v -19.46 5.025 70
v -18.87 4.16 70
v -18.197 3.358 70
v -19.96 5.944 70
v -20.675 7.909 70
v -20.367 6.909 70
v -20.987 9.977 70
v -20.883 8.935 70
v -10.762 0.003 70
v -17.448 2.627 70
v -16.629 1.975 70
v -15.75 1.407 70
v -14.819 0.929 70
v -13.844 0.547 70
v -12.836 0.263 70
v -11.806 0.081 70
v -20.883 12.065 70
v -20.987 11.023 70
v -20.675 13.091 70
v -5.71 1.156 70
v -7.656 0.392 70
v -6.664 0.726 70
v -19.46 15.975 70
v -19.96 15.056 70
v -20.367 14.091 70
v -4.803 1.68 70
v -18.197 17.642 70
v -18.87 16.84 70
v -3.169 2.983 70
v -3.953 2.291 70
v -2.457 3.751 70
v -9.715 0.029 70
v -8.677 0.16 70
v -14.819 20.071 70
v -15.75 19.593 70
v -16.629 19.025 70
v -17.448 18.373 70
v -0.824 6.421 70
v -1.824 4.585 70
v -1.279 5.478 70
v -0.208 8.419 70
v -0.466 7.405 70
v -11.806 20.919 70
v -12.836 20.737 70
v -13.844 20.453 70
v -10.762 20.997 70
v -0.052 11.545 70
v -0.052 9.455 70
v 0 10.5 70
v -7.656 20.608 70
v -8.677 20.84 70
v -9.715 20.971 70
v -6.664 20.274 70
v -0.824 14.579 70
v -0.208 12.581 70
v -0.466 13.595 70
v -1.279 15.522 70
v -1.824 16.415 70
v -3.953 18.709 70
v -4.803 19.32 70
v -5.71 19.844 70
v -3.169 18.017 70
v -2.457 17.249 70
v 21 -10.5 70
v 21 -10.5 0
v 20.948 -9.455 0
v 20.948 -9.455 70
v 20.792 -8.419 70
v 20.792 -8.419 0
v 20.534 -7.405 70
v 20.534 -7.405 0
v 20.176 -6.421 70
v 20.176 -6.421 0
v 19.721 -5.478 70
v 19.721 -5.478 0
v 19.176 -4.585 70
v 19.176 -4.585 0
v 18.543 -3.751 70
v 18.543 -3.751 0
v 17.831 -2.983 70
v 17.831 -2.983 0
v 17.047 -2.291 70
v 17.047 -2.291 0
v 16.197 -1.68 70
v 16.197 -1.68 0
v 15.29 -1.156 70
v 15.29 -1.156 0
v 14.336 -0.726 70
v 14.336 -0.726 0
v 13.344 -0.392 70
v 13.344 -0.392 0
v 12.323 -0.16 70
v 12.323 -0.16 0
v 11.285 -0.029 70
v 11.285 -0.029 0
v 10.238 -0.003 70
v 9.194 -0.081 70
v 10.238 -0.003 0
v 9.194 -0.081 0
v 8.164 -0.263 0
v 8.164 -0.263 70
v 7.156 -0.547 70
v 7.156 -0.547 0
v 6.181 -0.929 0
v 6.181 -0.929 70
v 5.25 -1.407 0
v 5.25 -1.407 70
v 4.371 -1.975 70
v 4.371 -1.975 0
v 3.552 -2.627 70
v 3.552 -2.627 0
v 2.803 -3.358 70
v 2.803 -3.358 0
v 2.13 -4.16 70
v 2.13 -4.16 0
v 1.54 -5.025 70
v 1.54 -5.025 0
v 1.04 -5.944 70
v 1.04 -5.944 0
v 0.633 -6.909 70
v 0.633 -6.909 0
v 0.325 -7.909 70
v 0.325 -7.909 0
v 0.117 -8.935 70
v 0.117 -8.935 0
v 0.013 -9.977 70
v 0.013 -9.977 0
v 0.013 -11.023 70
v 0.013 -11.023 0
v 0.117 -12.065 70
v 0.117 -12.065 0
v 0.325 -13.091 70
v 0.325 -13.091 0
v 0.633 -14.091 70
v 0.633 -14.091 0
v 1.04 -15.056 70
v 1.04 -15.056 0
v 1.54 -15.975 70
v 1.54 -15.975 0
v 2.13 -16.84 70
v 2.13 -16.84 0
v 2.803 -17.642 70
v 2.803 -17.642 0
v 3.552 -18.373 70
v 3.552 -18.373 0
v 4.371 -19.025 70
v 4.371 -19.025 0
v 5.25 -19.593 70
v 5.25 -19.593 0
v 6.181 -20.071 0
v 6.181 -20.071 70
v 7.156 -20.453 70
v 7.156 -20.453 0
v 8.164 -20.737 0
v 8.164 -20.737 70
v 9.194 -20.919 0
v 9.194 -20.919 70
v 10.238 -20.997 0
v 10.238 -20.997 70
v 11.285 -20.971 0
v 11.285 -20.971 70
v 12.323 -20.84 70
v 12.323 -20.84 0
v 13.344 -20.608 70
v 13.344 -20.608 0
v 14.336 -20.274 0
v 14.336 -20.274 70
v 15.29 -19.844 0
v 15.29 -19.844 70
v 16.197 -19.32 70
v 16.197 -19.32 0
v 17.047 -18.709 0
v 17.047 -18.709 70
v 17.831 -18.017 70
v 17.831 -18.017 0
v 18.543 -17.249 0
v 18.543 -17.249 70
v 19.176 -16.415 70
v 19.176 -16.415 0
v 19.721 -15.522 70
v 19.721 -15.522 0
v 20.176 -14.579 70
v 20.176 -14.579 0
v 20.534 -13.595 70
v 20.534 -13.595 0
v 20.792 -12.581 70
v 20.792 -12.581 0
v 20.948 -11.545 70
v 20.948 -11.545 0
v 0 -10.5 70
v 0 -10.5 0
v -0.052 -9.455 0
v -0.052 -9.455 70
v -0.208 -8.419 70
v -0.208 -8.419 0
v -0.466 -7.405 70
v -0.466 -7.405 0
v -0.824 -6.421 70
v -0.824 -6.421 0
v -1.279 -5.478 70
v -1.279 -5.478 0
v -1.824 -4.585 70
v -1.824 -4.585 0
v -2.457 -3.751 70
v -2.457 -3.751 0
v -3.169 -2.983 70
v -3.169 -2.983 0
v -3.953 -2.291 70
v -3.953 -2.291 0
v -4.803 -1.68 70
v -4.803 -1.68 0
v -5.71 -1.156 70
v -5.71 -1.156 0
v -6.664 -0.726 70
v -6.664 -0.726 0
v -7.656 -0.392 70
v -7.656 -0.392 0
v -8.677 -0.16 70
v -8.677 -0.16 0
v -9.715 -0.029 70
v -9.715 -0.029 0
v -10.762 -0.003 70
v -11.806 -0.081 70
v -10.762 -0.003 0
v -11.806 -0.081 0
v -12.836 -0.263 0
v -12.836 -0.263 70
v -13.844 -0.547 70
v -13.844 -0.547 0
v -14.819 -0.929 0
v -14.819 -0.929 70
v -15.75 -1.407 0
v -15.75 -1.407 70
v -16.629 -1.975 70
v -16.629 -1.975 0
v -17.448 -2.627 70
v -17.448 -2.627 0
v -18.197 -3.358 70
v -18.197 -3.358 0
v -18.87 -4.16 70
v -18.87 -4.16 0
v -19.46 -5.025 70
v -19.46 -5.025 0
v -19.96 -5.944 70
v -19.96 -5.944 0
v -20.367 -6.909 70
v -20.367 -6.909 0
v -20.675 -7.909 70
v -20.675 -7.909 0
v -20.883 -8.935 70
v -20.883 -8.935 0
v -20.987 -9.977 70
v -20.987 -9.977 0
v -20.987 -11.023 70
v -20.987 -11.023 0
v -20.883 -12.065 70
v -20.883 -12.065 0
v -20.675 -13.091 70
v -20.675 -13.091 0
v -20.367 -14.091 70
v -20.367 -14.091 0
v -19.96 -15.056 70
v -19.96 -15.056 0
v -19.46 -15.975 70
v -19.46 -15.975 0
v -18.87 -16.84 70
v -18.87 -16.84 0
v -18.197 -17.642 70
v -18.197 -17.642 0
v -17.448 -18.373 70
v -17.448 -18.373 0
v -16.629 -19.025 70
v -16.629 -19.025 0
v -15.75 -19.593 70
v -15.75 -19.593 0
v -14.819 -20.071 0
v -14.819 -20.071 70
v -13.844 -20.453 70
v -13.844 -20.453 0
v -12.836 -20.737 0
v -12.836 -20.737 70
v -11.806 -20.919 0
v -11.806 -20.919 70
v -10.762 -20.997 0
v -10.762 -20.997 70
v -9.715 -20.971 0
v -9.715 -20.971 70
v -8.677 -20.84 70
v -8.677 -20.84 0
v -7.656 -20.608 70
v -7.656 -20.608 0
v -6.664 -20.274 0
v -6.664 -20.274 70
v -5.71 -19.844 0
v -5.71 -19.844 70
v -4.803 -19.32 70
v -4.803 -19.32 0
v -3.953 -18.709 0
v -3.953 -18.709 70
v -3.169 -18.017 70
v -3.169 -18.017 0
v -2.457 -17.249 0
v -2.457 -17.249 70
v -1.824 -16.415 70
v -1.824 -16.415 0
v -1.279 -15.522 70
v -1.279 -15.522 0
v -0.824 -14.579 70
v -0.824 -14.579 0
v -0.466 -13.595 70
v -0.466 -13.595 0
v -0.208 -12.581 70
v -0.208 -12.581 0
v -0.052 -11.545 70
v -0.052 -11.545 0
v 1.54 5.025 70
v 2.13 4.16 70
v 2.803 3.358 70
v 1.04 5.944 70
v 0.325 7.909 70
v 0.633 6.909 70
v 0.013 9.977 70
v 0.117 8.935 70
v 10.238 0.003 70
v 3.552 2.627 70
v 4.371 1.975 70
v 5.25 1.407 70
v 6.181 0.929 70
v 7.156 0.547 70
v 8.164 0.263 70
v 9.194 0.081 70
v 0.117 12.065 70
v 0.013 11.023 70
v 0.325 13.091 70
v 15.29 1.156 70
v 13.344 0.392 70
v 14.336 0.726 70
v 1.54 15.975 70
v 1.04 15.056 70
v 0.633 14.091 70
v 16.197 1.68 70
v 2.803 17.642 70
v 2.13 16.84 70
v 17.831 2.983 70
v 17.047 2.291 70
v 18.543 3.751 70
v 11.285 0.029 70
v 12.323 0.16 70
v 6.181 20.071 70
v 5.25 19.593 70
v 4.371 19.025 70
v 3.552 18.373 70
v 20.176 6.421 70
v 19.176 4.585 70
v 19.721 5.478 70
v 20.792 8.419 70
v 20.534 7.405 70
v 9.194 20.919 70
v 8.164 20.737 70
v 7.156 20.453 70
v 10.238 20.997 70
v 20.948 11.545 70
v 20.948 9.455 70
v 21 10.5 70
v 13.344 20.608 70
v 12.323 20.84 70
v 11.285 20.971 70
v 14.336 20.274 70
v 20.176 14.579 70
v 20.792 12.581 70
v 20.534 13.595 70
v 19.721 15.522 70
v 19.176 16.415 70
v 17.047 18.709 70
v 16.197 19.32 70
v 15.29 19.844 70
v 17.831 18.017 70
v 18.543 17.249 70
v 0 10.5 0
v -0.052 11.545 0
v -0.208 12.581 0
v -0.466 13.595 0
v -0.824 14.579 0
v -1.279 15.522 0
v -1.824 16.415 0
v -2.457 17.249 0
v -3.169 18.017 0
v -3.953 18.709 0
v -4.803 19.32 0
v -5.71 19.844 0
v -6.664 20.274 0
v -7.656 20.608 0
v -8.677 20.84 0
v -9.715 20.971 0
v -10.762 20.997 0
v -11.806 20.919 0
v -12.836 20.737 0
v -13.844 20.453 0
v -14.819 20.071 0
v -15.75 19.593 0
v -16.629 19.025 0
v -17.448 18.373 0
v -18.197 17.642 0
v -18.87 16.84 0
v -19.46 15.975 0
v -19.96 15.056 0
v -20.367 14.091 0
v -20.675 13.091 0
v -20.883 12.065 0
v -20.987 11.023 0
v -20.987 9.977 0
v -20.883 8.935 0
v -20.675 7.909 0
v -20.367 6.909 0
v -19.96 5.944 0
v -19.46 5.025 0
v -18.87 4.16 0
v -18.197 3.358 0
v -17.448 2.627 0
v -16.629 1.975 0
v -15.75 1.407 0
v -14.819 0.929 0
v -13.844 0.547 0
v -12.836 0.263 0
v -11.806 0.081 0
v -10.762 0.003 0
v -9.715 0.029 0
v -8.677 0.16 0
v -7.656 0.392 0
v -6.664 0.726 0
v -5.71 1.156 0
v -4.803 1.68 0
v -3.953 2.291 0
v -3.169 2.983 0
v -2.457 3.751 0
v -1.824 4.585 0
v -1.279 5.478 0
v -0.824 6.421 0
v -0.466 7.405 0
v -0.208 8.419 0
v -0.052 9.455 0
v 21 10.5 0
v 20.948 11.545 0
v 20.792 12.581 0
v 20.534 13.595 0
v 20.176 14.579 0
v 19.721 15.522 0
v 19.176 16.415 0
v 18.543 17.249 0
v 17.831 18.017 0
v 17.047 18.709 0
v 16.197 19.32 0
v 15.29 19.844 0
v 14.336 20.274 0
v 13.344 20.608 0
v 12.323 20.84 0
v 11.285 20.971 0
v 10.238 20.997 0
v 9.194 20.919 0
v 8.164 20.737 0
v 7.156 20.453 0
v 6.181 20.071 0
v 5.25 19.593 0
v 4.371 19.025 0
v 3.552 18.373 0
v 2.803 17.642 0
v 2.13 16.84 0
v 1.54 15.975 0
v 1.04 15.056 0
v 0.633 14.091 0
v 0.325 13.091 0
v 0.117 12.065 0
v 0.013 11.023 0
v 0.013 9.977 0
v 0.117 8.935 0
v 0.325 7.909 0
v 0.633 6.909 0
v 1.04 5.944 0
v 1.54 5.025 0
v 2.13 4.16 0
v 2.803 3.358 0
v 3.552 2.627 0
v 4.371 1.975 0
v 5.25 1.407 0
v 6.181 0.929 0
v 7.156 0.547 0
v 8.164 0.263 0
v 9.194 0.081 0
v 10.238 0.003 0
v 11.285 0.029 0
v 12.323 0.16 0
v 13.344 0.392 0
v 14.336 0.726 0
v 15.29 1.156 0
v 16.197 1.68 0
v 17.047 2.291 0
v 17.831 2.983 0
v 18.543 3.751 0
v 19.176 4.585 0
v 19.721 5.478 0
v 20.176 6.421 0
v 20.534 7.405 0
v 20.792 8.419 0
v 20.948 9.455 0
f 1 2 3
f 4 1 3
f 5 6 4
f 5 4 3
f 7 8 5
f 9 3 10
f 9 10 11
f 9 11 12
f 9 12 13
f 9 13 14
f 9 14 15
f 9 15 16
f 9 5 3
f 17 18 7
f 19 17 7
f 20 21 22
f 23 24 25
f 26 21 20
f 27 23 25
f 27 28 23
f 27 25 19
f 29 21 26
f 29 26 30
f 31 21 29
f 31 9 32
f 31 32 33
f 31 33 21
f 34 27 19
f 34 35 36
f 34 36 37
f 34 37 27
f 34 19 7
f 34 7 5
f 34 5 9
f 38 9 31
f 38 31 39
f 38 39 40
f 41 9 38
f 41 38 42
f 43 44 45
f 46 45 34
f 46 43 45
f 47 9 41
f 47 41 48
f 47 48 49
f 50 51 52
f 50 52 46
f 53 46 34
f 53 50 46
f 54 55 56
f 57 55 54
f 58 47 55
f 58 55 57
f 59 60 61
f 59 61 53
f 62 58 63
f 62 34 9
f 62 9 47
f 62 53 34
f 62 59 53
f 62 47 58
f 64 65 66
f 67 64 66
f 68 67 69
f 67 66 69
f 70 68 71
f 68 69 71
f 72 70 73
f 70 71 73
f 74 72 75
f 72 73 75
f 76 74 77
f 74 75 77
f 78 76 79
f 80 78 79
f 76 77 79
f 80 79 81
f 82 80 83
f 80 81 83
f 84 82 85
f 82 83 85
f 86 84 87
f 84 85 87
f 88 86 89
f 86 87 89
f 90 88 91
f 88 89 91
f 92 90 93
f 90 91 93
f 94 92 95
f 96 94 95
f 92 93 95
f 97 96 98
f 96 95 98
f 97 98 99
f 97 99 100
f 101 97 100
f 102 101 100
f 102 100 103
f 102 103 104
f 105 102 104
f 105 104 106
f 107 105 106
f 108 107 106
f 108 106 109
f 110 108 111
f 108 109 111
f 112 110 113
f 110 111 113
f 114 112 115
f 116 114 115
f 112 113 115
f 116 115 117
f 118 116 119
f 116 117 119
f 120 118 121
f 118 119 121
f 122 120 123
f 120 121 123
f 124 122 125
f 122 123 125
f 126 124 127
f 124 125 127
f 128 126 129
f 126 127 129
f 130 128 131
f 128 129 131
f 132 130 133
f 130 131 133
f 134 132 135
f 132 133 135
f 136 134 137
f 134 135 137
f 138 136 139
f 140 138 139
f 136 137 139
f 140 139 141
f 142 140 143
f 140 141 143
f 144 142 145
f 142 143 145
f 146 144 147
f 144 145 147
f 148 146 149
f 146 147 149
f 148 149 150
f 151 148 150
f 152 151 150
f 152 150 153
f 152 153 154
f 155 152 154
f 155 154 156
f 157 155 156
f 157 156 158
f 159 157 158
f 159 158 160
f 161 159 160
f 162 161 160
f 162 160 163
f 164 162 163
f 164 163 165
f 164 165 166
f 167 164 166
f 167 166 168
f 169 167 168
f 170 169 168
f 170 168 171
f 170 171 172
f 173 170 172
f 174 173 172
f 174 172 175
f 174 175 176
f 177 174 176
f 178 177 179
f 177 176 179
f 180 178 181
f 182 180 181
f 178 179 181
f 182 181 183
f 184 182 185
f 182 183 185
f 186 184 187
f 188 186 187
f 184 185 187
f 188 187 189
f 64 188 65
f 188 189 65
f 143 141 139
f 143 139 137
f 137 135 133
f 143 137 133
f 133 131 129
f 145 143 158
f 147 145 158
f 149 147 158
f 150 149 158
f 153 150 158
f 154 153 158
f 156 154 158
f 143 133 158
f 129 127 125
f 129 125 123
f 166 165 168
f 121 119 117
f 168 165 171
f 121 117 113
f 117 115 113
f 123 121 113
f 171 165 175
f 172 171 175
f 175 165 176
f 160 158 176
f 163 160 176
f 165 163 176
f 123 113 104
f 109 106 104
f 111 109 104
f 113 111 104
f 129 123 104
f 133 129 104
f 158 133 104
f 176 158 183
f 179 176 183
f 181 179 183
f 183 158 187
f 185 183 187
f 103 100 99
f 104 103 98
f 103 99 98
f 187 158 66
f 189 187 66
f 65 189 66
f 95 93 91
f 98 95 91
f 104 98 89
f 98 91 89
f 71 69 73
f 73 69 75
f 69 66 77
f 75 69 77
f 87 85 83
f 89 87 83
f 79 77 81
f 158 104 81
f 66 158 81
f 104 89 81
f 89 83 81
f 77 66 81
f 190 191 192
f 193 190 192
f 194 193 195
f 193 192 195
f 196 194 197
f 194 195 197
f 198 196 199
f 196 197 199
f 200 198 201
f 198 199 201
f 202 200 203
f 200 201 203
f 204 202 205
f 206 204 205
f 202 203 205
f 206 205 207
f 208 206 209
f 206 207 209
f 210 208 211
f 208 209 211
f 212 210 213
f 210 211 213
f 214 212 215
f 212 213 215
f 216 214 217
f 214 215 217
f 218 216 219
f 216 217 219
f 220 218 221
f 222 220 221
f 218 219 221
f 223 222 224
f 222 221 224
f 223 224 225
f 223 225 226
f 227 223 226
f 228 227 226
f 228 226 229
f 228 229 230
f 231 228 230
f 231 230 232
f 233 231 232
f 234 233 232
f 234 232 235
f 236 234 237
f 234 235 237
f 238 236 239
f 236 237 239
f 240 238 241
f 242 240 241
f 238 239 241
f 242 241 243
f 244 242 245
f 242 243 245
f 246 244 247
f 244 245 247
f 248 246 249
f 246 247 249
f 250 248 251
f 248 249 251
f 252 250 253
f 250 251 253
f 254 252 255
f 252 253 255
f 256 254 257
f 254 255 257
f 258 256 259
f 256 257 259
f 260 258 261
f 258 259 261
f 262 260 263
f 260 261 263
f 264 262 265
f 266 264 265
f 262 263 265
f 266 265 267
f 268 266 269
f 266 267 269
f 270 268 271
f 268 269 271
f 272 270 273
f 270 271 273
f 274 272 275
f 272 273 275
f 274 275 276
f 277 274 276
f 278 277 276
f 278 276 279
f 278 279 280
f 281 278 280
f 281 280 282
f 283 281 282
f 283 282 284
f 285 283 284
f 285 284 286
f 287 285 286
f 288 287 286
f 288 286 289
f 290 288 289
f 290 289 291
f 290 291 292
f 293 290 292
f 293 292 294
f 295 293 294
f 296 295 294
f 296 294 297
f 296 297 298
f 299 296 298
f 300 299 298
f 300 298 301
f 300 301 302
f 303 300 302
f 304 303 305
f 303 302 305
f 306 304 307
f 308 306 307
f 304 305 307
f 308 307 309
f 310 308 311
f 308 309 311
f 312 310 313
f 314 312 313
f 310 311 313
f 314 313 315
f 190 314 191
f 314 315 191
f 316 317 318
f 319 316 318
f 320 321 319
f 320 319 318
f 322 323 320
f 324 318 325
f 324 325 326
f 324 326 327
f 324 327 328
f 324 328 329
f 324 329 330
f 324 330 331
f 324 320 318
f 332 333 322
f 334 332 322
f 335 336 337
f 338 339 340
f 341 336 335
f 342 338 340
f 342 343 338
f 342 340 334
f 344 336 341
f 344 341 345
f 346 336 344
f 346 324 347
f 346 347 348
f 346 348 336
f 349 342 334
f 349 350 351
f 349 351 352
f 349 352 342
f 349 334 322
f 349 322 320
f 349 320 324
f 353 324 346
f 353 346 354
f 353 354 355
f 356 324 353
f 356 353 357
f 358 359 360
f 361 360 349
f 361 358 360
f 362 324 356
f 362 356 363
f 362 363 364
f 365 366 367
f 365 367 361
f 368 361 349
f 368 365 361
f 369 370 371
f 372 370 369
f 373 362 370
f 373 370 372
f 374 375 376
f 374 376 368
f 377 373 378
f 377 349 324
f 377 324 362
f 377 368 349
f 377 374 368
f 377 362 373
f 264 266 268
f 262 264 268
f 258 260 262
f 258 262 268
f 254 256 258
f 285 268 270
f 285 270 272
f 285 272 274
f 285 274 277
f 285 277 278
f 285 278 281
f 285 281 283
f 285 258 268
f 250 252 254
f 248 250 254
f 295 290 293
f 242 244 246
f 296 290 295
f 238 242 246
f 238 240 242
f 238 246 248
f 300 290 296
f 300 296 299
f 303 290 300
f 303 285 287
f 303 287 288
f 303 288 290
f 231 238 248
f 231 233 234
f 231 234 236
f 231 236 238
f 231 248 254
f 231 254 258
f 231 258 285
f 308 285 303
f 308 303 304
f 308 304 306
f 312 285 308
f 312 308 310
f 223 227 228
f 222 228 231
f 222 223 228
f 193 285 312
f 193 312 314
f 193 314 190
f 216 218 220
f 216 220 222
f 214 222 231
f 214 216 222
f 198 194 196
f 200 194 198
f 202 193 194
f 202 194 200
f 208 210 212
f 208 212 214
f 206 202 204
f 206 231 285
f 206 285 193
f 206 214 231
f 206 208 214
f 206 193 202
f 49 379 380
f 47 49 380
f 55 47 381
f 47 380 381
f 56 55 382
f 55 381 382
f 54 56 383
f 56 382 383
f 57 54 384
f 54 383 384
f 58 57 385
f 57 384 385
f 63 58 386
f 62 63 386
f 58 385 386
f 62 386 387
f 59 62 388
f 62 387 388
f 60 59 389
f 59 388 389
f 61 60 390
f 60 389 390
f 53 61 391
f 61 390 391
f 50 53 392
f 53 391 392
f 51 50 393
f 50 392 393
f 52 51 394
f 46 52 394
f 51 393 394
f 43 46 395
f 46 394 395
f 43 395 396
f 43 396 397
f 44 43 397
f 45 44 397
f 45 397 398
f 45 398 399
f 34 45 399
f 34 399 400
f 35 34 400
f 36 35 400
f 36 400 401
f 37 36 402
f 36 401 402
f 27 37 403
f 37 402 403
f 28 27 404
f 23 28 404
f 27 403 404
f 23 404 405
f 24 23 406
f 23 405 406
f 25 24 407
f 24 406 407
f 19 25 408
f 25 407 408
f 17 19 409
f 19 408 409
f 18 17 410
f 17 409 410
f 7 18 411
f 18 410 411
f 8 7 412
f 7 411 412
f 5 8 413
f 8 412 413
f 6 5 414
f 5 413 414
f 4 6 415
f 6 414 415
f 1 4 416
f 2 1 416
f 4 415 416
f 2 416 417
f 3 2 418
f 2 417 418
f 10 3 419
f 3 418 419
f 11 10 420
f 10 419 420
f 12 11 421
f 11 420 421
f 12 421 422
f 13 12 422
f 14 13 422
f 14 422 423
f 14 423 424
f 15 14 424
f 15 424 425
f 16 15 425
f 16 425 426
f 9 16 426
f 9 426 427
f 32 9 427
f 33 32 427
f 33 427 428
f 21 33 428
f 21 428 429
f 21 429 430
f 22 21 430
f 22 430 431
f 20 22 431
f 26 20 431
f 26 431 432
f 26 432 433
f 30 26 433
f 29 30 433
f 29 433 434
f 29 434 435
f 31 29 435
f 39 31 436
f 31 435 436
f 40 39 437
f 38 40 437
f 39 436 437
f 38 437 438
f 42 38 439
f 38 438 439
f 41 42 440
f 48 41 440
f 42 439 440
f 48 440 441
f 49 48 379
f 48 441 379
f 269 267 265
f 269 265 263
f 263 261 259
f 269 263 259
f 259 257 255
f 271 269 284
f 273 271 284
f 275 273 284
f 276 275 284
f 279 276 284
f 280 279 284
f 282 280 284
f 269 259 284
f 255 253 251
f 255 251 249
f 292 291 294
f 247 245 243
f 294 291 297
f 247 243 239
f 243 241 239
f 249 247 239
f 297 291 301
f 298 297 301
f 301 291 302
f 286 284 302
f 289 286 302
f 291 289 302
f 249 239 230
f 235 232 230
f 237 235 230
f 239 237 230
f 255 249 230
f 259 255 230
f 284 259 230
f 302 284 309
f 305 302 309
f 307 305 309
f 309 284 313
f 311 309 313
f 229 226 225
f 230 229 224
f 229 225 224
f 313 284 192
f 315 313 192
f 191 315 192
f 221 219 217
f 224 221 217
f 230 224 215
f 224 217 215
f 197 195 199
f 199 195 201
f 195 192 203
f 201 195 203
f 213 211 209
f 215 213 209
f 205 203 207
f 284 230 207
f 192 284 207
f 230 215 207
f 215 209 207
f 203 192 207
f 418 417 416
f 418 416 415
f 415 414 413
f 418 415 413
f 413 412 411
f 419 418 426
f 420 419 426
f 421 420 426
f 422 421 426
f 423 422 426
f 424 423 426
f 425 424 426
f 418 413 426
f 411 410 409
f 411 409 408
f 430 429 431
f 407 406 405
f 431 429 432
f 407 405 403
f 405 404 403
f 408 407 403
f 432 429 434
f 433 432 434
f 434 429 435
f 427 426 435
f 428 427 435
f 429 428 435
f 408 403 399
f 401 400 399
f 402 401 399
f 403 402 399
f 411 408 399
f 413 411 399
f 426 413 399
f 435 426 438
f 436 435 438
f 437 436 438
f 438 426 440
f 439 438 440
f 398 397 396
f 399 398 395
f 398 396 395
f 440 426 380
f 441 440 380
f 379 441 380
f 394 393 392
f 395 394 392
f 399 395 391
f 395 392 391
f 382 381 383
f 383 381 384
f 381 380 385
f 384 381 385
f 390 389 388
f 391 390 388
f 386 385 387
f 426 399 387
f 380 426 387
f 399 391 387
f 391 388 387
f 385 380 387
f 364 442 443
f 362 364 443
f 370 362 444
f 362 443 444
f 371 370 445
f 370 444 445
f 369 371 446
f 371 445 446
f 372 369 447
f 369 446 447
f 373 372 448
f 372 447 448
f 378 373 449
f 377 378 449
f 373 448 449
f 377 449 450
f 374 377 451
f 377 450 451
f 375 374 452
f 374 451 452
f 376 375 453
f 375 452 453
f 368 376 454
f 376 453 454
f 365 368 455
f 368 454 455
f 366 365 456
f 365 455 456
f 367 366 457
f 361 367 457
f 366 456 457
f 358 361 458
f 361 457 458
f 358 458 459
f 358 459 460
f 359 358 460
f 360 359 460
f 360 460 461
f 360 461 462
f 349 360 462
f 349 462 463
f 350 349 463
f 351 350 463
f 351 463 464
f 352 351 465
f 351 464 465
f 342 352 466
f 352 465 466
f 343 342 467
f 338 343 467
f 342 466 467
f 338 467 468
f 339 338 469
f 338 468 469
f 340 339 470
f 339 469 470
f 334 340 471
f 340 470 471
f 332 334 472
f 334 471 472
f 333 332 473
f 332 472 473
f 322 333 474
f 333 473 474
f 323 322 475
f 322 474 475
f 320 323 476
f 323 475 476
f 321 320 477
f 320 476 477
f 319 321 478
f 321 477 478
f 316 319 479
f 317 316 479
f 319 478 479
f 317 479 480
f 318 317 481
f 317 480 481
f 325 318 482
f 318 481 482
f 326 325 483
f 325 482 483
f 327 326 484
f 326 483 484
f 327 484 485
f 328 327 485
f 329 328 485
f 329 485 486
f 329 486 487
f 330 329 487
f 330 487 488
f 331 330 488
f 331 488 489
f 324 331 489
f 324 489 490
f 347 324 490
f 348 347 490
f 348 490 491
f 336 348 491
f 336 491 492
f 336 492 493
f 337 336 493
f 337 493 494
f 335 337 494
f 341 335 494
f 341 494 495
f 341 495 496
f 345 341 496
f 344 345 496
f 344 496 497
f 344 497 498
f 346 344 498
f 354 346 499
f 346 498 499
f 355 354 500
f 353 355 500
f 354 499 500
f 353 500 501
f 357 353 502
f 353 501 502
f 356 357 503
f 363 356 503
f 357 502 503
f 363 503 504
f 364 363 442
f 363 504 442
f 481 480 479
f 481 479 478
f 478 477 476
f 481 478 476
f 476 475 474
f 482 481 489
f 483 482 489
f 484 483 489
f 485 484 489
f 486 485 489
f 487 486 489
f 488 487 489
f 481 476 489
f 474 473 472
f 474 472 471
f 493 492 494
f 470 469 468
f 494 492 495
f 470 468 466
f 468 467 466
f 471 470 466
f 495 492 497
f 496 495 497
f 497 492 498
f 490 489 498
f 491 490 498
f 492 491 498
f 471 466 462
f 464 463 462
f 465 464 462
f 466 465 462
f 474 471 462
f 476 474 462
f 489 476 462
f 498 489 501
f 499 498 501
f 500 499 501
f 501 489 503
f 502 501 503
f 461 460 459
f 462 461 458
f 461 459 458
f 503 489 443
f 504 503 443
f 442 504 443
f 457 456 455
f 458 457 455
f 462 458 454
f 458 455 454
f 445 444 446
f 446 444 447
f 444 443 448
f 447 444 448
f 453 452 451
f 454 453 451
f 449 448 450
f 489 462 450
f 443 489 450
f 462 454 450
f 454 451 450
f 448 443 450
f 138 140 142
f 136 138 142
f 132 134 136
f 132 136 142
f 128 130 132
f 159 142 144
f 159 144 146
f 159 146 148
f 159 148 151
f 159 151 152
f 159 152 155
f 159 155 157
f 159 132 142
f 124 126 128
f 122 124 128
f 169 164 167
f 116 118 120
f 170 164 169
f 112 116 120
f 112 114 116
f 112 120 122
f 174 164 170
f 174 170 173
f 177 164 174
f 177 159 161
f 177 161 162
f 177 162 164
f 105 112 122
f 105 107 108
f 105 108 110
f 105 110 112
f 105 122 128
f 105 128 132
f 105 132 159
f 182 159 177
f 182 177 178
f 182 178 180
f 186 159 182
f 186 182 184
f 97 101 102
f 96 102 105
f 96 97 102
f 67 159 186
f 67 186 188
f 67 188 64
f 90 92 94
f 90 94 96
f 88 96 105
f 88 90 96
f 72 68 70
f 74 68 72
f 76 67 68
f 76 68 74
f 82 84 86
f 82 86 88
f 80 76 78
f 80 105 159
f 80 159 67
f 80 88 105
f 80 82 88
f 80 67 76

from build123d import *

# Parameters (mm, degrees)
SKETCH1_R             = 10.5
BOSS_EXTRUDE1_DEPTH   = 70
BOSS_EXTRUDE1_2_DEPTH = 70
BOSS_EXTRUDE1_3_DEPTH = 70
BOSS_EXTRUDE1_4_DEPTH = 70


with BuildPart() as part:
    # Sketch1 → Boss-Extrude1 (new body)
    with BuildSketch(Plane.XY):
        with Locations((-10.5, 10.5)):
            Circle(SKETCH1_R)
    extrude(amount=BOSS_EXTRUDE1_DEPTH)


with BuildPart() as body_2:
    # Sketch1 → Boss-Extrude1 2 (new body)
    with BuildSketch(Plane.XY):
        with Locations((10.5, 10.5)):
            Circle(SKETCH1_R)
    extrude(amount=BOSS_EXTRUDE1_2_DEPTH)


with BuildPart() as body_3:
    # Sketch1 → Boss-Extrude1 3 (new body)
    with BuildSketch(Plane.XY):
        with Locations((-10.5, -10.5)):
            Circle(SKETCH1_R)
    extrude(amount=BOSS_EXTRUDE1_3_DEPTH)


with BuildPart() as body_4:
    # Sketch1 → Boss-Extrude1 4 (new body)
    with BuildSketch(Plane.XY):
        with Locations((10.5, -10.5)):
            Circle(SKETCH1_R)
    extrude(amount=BOSS_EXTRUDE1_4_DEPTH)


solid = Compound([part.part, body_2.part, body_3.part, body_4.part])
